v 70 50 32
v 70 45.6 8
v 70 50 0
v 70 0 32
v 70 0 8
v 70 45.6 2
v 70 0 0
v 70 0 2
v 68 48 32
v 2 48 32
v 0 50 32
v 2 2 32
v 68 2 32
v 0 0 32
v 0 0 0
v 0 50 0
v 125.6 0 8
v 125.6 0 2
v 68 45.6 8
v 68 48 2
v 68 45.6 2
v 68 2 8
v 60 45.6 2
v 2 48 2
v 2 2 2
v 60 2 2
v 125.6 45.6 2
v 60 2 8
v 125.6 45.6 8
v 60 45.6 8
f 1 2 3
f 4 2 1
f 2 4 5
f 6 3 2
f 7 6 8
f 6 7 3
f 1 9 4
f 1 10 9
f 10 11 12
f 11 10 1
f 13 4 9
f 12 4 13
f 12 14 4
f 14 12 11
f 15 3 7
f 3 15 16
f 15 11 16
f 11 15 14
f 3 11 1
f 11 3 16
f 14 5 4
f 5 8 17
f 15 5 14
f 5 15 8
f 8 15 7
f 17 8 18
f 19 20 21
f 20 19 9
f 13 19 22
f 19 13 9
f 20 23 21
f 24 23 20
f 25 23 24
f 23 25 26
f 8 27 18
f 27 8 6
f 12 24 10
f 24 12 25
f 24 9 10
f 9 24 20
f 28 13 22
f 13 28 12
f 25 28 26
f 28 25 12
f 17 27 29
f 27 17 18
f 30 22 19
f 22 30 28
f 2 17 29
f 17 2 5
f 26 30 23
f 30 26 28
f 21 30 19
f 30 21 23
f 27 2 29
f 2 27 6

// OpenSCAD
// Two-part enclosure for small electronics board
// Print orientation: box upright (open top), lid upside down (lip facing up)
// Units: mm

// ---------- Parameters ----------
box_x      = 70;    // box outer length (X)
box_y      = 50;    // box outer width (Y)
box_z      = 30;    // box height (Z)
box_wall   = 2;     // box wall thickness
box_floor  = 2;     // box floor thickness

lip_t      = 1.5;   // lip wall thickness
lip_h      = 4;     // lip height
lip_x      = 65.6;  // lip outer length (X)
lip_y      = 45.6;  // lip outer width (Y)
lip_clear  = 0.2;   // clearance between lip and box opening (each side)

plate_t    = 2;     // plate thickness under lip
gap        = 10;    // gap between box and lid on bed
eps        = 0.5;   // cutter overshoot

$fn = 64;

// ---------- Derived ----------
lip_x2 = lip_x - 2 * lip_clear;   // lip inner length (X)
lip_y2 = lip_y - 2 * lip_clear;   // lip inner width (Y)

// ---------- Model ----------
union() {
    // Box
    difference() {
        cube([box_x, box_y, box_z + box_floor]);
        translate([box_wall, box_wall, box_floor])
            cube([box_x - 2 * box_wall, box_y - 2 * box_wall, box_z + 1]);   // open top
    }

    // Lid: plate + lip
    union() {
        // Plate
        translate([0, 0, 0])
            cube([box_x, box_y, plate_t]);

        // Lip
        translate([box_x - gap, 0, plate_t])
            cube([lip_x, lip_y, lip_h + plate_t]);

        // Lip pocket (cut through plate and into lip)
        translate([box_x - gap, 0, plate_t])
            cube([lip_x2, lip_y2, lip_h + 1 + eps]);
    }
}
